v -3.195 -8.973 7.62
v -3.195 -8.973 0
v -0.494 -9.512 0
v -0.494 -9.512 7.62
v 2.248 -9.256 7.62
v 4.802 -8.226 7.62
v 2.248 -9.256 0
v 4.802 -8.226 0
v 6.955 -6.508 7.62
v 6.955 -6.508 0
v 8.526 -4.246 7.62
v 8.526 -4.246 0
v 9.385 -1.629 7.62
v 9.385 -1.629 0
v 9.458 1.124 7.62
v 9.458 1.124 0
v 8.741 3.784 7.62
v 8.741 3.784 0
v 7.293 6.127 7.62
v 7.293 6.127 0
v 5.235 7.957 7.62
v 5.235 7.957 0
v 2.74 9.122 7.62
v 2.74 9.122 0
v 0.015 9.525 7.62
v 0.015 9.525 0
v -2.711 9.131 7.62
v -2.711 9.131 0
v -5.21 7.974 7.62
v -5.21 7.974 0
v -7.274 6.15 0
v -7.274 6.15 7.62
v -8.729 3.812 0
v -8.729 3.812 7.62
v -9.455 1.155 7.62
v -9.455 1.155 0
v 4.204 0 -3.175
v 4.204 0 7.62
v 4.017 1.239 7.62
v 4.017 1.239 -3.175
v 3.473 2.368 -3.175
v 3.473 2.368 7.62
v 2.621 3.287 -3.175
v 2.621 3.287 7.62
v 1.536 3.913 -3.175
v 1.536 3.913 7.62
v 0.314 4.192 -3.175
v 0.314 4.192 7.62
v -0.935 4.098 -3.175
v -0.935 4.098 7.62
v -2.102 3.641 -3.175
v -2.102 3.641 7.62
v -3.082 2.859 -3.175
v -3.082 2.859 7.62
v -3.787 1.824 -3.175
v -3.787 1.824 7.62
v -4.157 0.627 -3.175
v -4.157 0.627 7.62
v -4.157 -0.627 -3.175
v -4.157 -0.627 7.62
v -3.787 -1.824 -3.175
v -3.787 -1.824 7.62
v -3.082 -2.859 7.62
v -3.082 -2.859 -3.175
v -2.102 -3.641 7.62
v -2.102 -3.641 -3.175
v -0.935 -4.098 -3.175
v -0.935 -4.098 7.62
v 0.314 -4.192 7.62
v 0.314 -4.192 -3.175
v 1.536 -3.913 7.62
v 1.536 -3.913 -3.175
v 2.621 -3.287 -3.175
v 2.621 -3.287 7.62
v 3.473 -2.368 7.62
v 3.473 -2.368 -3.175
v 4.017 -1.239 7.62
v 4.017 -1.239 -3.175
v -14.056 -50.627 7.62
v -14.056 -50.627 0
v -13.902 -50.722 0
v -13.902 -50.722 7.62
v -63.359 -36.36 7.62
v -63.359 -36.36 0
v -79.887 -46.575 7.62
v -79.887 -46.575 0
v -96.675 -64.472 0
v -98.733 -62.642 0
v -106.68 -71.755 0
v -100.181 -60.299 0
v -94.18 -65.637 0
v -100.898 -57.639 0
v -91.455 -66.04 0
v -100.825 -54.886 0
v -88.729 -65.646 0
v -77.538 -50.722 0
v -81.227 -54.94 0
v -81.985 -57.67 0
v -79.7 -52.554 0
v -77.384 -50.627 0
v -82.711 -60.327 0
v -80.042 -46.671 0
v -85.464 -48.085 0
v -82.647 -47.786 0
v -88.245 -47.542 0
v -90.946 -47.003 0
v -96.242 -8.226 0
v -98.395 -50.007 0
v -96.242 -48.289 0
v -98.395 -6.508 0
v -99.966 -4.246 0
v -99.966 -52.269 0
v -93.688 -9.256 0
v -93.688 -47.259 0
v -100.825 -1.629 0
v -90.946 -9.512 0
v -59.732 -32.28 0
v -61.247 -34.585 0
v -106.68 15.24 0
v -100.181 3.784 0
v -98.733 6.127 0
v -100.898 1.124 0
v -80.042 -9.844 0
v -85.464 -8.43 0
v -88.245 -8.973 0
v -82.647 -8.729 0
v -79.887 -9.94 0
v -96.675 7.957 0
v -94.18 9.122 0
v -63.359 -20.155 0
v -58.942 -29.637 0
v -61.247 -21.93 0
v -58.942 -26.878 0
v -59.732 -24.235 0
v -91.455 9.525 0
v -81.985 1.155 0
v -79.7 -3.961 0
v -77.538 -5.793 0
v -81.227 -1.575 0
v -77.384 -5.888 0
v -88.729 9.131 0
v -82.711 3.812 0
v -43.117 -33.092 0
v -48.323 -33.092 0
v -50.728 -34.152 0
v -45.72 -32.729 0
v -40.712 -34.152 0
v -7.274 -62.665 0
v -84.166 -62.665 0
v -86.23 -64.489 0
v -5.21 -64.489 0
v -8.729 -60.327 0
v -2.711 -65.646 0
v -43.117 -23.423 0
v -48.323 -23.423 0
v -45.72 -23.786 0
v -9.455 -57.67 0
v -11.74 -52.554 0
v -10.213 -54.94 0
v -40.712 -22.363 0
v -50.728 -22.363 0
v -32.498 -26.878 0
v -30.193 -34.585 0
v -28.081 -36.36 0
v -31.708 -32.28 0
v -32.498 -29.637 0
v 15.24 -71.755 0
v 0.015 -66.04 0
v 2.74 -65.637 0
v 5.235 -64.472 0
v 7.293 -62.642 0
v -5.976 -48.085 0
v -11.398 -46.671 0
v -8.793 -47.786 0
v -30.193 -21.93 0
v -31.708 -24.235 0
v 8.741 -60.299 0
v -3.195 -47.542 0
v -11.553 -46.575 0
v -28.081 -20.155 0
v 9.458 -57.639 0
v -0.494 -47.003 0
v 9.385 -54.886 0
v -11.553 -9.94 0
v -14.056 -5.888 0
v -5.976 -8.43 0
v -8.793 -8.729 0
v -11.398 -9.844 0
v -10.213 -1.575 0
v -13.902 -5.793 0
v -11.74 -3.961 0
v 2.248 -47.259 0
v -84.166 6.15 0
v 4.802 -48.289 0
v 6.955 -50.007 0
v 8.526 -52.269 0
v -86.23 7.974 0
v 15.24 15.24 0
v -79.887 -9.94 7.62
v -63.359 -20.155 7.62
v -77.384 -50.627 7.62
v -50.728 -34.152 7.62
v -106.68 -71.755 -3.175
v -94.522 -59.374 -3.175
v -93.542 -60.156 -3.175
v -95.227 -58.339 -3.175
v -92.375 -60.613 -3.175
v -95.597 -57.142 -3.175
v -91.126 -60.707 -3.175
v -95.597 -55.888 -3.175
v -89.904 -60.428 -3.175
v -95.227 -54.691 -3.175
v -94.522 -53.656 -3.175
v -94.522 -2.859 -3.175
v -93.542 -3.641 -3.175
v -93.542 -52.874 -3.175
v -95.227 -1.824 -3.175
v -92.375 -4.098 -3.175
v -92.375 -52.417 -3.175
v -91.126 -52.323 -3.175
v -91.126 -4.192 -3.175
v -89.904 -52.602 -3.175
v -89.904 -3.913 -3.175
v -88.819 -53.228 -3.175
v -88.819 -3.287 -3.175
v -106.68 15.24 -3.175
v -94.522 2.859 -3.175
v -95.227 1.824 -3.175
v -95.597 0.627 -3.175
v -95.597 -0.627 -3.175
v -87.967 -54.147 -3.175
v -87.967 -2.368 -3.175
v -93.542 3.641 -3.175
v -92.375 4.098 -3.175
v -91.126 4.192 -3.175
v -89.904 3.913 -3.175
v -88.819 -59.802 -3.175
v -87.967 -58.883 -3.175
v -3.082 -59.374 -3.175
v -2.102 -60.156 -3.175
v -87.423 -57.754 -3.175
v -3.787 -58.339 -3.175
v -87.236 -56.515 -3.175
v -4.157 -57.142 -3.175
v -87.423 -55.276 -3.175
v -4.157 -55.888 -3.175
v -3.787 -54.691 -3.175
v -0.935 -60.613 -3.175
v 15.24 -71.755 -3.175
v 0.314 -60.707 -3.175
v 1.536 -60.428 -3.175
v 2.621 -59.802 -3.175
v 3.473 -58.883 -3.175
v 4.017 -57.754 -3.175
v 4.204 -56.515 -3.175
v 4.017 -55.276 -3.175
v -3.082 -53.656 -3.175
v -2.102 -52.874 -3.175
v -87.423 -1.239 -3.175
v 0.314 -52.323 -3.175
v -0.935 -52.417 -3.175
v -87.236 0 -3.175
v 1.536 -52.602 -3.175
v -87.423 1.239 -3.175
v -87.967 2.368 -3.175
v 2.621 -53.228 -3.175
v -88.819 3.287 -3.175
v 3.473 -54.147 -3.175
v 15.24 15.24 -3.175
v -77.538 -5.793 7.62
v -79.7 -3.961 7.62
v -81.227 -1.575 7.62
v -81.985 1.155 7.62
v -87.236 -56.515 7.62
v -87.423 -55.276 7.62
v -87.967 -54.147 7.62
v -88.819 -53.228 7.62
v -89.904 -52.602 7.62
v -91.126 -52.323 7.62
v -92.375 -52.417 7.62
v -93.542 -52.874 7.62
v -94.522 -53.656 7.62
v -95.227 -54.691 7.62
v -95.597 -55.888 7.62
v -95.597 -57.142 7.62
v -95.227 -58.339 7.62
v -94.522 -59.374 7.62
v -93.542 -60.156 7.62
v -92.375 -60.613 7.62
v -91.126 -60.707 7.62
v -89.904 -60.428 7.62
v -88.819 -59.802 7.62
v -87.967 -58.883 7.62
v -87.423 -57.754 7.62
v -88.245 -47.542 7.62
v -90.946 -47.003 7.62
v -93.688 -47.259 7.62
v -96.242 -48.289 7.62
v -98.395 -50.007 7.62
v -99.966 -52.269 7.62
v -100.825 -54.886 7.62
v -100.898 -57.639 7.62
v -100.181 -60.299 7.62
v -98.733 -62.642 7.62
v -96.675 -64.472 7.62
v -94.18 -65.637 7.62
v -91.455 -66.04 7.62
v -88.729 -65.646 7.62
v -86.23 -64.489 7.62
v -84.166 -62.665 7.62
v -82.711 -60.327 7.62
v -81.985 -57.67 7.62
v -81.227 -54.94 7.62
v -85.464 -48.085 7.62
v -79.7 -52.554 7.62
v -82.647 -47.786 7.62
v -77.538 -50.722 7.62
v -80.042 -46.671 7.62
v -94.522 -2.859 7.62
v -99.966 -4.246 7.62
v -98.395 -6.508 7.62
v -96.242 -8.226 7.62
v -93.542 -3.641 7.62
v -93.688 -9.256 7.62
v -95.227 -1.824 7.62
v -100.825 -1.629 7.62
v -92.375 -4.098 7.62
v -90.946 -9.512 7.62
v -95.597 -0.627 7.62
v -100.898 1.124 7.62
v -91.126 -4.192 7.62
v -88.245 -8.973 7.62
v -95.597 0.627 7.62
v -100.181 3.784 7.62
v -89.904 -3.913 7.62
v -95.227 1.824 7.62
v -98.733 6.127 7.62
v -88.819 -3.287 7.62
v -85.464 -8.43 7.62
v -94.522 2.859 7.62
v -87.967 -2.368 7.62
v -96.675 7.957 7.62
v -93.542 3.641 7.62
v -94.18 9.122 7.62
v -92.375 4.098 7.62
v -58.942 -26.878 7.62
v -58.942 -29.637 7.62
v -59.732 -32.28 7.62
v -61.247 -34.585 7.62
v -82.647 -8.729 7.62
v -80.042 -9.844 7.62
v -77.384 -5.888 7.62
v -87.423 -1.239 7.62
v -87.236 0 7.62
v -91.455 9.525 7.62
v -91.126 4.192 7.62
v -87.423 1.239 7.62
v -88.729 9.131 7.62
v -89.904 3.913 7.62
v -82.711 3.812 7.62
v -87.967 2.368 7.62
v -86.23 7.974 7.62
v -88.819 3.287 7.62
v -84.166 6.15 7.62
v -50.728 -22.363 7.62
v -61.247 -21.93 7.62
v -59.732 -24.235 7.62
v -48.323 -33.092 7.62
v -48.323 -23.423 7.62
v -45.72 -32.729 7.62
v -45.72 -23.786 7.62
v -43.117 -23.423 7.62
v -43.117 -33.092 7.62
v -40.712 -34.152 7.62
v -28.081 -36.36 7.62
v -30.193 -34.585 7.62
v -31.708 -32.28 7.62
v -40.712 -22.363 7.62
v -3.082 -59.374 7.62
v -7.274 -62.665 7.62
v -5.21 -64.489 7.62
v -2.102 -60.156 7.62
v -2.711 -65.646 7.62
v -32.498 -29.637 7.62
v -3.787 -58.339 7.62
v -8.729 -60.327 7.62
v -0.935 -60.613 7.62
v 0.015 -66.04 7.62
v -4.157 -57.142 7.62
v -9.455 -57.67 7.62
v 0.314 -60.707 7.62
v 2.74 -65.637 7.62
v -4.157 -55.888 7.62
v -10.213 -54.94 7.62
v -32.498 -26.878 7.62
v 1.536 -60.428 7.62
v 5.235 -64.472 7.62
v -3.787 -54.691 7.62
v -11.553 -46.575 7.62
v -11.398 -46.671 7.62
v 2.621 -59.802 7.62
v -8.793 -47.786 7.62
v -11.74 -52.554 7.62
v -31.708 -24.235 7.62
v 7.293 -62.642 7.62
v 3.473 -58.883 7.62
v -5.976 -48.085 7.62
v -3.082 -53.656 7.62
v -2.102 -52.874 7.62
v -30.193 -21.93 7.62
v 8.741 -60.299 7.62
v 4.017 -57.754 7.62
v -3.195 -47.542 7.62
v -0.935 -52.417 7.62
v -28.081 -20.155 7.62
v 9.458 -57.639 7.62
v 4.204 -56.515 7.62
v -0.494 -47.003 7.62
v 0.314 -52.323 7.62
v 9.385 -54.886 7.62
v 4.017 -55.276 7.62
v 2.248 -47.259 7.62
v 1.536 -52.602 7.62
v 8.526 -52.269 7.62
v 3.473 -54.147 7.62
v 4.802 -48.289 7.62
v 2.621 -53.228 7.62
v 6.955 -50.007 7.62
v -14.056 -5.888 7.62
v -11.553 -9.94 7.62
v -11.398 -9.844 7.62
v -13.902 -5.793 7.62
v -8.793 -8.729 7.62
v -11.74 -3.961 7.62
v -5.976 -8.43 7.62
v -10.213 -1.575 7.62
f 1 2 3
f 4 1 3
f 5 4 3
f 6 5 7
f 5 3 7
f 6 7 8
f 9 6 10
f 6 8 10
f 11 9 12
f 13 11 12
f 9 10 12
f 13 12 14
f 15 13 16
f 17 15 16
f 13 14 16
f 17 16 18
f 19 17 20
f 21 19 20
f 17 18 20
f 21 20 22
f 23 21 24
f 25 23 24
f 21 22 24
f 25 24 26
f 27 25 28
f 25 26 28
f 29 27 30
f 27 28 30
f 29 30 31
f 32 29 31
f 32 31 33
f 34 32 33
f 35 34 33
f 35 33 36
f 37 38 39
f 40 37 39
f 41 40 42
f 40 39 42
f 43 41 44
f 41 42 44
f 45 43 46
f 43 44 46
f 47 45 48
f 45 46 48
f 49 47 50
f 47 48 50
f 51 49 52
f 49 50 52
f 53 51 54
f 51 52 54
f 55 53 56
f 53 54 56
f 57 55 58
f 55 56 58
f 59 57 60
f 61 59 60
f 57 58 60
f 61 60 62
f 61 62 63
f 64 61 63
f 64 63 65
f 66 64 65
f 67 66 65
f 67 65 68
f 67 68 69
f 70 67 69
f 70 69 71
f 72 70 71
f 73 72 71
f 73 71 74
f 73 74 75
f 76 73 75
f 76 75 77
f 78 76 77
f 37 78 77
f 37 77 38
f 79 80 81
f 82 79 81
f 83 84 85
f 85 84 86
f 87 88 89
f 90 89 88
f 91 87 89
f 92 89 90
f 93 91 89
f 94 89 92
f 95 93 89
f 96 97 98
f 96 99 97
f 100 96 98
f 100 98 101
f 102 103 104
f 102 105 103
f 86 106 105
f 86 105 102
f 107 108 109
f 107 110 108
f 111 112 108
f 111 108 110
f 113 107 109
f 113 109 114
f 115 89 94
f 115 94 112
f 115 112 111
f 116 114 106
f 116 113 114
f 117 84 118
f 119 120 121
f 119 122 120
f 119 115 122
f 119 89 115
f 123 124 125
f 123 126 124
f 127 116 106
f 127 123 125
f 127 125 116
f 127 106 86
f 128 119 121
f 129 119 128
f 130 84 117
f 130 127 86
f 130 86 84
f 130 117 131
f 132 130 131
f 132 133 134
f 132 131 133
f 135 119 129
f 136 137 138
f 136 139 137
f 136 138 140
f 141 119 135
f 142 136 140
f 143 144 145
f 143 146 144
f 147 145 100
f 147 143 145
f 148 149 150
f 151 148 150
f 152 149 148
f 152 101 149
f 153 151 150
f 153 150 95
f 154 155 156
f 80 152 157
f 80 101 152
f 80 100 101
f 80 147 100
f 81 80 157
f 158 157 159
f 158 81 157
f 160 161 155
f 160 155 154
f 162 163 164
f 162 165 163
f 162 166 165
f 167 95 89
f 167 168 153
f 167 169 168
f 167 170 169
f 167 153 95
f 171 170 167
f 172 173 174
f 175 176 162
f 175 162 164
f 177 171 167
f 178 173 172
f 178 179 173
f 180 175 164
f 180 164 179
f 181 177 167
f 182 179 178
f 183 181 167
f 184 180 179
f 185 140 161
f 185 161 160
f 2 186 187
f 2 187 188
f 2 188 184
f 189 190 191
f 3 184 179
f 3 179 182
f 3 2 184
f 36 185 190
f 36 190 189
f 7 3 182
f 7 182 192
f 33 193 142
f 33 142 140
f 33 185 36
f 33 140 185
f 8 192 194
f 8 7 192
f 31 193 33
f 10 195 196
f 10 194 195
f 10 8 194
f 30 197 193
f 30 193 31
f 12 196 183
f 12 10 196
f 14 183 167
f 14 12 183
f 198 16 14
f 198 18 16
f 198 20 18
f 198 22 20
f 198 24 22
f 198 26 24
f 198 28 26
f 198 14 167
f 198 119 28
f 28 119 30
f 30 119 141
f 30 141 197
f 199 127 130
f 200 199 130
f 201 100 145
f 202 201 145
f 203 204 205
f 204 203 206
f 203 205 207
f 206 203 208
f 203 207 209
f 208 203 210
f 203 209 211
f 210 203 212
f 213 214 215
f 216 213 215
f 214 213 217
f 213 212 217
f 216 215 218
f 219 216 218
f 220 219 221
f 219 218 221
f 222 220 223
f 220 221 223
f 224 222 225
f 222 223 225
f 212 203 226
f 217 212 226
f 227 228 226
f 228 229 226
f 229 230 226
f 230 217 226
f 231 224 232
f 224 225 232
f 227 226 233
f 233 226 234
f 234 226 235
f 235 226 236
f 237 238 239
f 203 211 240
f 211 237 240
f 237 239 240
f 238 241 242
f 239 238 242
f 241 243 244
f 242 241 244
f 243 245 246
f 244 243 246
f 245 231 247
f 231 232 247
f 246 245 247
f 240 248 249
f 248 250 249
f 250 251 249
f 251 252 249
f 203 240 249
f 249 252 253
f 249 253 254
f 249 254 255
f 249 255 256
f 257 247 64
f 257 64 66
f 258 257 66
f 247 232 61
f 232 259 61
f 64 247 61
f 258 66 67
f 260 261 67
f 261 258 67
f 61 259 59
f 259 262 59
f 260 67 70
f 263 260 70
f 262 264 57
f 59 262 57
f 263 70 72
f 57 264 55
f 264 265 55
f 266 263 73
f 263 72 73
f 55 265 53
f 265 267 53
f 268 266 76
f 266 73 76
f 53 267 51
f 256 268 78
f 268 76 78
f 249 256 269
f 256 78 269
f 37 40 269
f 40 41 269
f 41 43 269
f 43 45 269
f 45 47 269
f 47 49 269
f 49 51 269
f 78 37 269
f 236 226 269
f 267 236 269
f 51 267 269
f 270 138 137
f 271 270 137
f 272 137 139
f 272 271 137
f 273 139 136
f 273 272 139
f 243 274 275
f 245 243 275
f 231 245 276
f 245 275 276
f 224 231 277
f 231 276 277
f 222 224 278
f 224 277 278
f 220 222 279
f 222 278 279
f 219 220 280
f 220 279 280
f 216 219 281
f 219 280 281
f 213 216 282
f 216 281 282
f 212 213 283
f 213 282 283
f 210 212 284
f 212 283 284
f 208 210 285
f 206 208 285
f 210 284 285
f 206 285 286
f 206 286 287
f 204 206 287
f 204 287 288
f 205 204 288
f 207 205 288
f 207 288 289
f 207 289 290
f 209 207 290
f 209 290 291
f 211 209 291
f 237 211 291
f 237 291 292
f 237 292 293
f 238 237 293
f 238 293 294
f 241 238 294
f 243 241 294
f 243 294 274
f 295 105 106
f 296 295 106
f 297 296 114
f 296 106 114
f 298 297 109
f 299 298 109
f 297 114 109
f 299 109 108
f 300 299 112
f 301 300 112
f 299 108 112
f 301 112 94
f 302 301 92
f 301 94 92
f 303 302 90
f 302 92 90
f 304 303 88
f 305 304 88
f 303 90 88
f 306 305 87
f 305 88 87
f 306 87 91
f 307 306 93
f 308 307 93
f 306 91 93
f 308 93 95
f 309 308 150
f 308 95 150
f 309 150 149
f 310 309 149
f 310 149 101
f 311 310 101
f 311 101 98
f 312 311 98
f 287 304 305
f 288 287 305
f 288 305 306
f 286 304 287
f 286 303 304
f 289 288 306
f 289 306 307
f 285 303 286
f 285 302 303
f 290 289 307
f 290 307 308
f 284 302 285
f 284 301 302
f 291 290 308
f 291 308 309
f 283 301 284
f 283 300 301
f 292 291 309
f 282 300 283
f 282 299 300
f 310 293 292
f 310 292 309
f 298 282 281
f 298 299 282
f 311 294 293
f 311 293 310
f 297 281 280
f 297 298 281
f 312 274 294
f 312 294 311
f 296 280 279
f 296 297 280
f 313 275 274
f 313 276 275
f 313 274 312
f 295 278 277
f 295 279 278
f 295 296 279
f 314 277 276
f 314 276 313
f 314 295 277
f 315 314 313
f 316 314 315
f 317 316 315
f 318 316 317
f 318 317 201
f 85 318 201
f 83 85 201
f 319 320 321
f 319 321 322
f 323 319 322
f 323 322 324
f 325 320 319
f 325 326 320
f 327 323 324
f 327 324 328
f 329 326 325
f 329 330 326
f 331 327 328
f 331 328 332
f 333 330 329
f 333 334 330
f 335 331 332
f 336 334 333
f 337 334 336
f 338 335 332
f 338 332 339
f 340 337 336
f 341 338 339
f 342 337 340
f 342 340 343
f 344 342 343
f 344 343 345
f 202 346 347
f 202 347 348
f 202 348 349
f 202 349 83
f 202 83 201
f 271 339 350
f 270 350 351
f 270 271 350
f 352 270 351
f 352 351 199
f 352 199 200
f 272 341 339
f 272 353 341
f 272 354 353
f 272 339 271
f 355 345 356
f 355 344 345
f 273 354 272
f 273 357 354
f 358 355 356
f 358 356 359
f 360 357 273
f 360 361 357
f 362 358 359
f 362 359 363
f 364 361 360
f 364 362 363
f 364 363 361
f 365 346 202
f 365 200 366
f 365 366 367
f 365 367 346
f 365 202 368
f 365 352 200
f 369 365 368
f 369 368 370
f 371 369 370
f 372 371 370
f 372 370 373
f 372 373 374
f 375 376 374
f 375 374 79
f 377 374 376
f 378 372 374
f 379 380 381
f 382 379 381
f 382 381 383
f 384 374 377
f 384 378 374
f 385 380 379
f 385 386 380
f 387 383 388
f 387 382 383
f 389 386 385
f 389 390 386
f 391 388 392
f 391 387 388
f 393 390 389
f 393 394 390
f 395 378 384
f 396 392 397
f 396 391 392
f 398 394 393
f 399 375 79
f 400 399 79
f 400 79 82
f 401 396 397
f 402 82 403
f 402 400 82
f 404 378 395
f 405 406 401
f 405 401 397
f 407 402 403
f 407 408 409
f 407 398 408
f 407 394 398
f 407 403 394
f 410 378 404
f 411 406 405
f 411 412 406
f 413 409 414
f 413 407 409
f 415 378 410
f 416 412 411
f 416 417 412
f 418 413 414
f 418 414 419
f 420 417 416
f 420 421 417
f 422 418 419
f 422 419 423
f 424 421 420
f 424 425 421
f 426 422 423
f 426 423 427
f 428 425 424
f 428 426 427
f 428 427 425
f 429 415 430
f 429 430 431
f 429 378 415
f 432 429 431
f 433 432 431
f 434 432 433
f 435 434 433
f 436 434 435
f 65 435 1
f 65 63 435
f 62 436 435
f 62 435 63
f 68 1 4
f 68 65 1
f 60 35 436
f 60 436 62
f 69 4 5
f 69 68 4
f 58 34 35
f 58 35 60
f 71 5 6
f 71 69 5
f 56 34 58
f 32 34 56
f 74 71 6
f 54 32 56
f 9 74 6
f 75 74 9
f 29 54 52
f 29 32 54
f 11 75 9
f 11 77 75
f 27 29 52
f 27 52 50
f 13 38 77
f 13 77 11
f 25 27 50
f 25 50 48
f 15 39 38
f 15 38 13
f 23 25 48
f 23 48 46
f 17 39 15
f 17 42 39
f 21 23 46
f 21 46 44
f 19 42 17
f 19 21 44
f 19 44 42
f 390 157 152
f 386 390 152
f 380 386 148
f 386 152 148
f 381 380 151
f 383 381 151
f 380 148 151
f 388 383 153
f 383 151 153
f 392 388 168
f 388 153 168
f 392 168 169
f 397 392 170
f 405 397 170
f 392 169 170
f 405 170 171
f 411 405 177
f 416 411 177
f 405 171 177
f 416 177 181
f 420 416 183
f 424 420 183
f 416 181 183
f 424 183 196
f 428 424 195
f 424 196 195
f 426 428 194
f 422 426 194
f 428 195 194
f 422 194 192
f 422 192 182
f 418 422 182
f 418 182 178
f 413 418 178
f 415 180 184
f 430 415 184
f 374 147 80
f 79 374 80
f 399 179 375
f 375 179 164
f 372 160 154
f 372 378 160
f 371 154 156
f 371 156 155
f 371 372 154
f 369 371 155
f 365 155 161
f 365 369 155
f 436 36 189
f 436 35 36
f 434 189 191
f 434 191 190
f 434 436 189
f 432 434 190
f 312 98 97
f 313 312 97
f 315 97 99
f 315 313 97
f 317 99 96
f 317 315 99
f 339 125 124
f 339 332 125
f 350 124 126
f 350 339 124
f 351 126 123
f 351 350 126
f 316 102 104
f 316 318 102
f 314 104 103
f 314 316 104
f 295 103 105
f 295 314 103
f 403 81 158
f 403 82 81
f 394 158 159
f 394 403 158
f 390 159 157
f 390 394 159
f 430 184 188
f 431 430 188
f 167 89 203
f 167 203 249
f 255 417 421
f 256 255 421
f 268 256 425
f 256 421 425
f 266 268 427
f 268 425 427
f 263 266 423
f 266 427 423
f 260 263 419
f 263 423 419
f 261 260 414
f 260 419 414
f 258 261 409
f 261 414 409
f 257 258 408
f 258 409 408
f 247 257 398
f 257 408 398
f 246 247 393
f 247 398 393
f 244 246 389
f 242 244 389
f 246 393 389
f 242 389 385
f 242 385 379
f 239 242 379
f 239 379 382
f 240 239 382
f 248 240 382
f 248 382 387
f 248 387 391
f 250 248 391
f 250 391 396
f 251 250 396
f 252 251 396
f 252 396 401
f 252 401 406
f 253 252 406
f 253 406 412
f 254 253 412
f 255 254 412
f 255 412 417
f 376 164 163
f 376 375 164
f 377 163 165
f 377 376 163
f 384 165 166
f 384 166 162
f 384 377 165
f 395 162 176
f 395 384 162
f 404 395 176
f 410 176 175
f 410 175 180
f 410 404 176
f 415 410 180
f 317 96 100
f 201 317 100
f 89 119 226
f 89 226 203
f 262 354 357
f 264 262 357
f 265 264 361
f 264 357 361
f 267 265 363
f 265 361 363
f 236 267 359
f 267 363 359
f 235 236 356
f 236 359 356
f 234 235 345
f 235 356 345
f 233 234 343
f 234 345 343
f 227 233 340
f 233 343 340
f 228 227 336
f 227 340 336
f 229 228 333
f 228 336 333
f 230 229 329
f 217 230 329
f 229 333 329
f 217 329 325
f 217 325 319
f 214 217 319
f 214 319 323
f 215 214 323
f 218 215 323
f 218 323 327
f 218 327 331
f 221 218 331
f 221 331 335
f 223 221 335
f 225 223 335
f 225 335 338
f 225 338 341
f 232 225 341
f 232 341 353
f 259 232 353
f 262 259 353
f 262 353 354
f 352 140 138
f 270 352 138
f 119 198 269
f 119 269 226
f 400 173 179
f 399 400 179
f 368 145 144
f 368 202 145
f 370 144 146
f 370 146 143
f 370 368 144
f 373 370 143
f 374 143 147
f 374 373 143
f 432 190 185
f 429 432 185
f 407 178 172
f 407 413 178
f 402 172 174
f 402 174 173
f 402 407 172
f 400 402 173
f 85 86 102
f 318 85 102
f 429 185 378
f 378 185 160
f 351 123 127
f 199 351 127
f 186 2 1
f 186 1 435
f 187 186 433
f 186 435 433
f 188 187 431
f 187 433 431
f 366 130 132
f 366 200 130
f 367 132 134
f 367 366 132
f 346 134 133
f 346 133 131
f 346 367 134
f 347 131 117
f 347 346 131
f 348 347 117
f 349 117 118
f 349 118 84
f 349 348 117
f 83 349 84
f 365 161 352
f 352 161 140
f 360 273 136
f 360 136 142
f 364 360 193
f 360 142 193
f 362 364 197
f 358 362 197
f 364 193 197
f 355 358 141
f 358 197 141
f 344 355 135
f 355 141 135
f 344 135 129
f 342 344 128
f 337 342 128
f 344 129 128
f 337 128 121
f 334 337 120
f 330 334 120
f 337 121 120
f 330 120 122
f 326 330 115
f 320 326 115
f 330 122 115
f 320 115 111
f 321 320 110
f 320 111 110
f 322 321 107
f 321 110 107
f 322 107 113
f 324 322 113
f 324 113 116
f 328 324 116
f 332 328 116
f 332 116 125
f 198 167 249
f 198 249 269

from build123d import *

# Parameters (mm, degrees)
F1_DEPTH = 3.175
F3_DEPTH = 7.62
F4_R     = 9.525
F5_R     = 4.2037
F6_DEPTH = 10.796


with BuildPart() as f1:
    # F0 (on Top) → F1 (new body)
    with BuildSketch(Plane.XY):
        with BuildLine():
            Line((15.24, -56.515), (15.24, 0))
            ThreePointArc((15.24, 0), (-10.7763073453, -10.7763073453), (0, 15.24))
            Line((0, 15.24), (-91.44, 15.24))
            ThreePointArc((-91.44, 15.24), (-80.6636926547, 10.7763073453), (-76.2, 0))
            ThreePointArc((-76.2, 0), (-91.44, -15.24), (-106.68, 0))
            Line((-106.68, 0), (-106.68, -56.515))
            ThreePointArc((-106.68, -56.515), (-91.44, -41.275), (-76.2, -56.515))
            ThreePointArc((-76.2, -56.515), (-80.6636926547, -67.2913073453), (-91.44, -71.755))
            Line((-91.44, -71.755), (0, -71.755))
            ThreePointArc((0, -71.755), (-10.7763073453, -45.7386926547), (15.24, -56.515))
        make_face()
        with BuildLine():
            ThreePointArc((-106.68, -56.515), (-102.2163073453, -67.2913073453), (-91.44, -71.755))
            ThreePointArc((-91.44, -71.755), (-80.6636926547, -67.2913073453), (-76.2, -56.515))
            ThreePointArc((-76.2, -56.515), (-91.44, -41.275), (-106.68, -56.515))
        make_face()
        with BuildLine():
            ThreePointArc((-76.2, 0), (-80.6636926547, 10.7763073453), (-91.44, 15.24))
            ThreePointArc((-91.44, 15.24), (-102.2163073453, 10.7763073453), (-106.68, 0))
            ThreePointArc((-106.68, 0), (-91.44, -15.24), (-76.2, 0))
        make_face()
        with BuildLine():
            ThreePointArc((0, 15.24), (-10.7763073453, -10.7763073453), (15.24, 0))
            ThreePointArc((15.24, 0), (10.7763073453, 10.7763073453), (0, 15.24))
        make_face()
        with BuildLine():
            ThreePointArc((0, -71.755), (10.7763073453, -67.2913073453), (15.24, -56.515))
            ThreePointArc((15.24, -56.515), (-10.7763073453, -45.7386926547), (0, -71.755))
        make_face()
        with BuildLine():
            Line((15.24, -71.755), (15.24, -56.515))
            ThreePointArc((15.24, -56.515), (10.7763073453, -67.2913073453), (0, -71.755))
            Line((0, -71.755), (15.24, -71.755))
        make_face()
        with BuildLine():
            Line((-106.68, -71.755), (-91.44, -71.755))
            ThreePointArc((-91.44, -71.755), (-102.2163073453, -67.2913073453), (-106.68, -56.515))
            Line((-106.68, -56.515), (-106.68, -71.755))
        make_face()
        with BuildLine():
            ThreePointArc((-106.68, 0), (-102.2163073453, 10.7763073453), (-91.44, 15.24))
            Line((-91.44, 15.24), (-106.68, 15.24))
            Line((-106.68, 15.24), (-106.68, 0))
        make_face()
        with BuildLine():
            ThreePointArc((0, 15.24), (10.7763073453, 10.7763073453), (15.24, 0))
            Line((15.24, 0), (15.24, 15.24))
            Line((15.24, 15.24), (0, 15.24))
        make_face()
    extrude(amount=-F1_DEPTH)

    # F2 (on face) → F3 (join)
    with BuildSketch(Plane.XY):
        with BuildLine():
            Line((-9.0970156165, -2.8231067769), (-14.056494823, -5.8883404532))
            ThreePointArc((-14.056494823, -5.8883404532), (-12.9637932823, -8.0123444592), (-11.5526371794, -9.9395258539))
            Line((-11.5526371794, -9.9395258539), (-6.593157973, -6.8742921776))
            ThreePointArc((-6.593157973, -6.8742921776), (8.1023708015, 5.007715287), (-9.0970156165, -2.8231067769))
        make_face()
        with BuildLine():
            ThreePointArc((-11.5526371794, -46.5754741461), (-12.9637932823, -48.5026555408), (-14.056494823, -50.6266595468))
            Line((-14.056494823, -50.6266595468), (-9.0970156165, -53.6918932231))
            ThreePointArc((-9.0970156165, -53.6918932231), (8.1023708015, -61.522715287), (-6.593157973, -49.6407078224))
            Line((-6.593157973, -49.6407078224), (-11.5526371794, -46.5754741461))
        make_face()
        with BuildLine():
            ThreePointArc((-77.383505177, -50.6266595468), (-78.4762067177, -48.5026555408), (-79.8873628206, -46.5754741461))
            Line((-79.8873628206, -46.5754741461), (-84.846842027, -49.6407078224))
            ThreePointArc((-84.846842027, -49.6407078224), (-99.5423708015, -61.522715287), (-82.3429843835, -53.6918932231))
            Line((-82.3429843835, -53.6918932231), (-77.383505177, -50.6266595468))
        make_face()
        with BuildLine():
            ThreePointArc((-82.3429843835, -2.8231067769), (-99.5423708015, 5.007715287), (-84.846842027, -6.8742921776))
            Line((-84.846842027, -6.8742921776), (-79.8873628206, -9.9395258539))
            ThreePointArc((-79.8873628206, -9.9395258539), (-78.4762067177, -8.0123444592), (-77.383505177, -5.8883404532))
            Line((-77.383505177, -5.8883404532), (-82.3429843835, -2.8231067769))
        make_face()
        with BuildLine():
            ThreePointArc((-77.383505177, -5.8883404532), (-78.4762067177, -8.0123444592), (-79.8873628206, -9.9395258539))
            Line((-79.8873628206, -9.9395258539), (-50.249292292, -28.2575))
            Line((-50.249292292, -28.2575), (-79.8873628206, -46.5754741461))
            ThreePointArc((-79.8873628206, -46.5754741461), (-78.4762067177, -48.5026555408), (-77.383505177, -50.6266595468))
            Line((-77.383505177, -50.6266595468), (-45.72, -31.0568542638))
            Line((-45.72, -31.0568542638), (-14.056494823, -50.6266595468))
            ThreePointArc((-14.056494823, -50.6266595468), (-12.9637932823, -48.5026555408), (-11.5526371794, -46.5754741461))
            Line((-11.5526371794, -46.5754741461), (-41.190707708, -28.2575))
            Line((-41.190707708, -28.2575), (-11.5526371794, -9.9395258539))
            ThreePointArc((-11.5526371794, -9.9395258539), (-12.9637932823, -8.0123444592), (-14.056494823, -5.8883404532))
            Line((-14.056494823, -5.8883404532), (-45.72, -25.4581457362))
            Line((-45.72, -25.4581457362), (-77.383505177, -5.8883404532))
        make_face()
    extrude(amount=F3_DEPTH)

    # F4
    f4_edges = [f1.edges().sort_by_distance(p)[0] for p in [
        (-45.72, -31.056854, 3.81),
        (-82.342984, -53.691893, 3.81),
        (-9.097016, -53.691893, 3.81),
        (-6.593158, -6.874292, 3.81),
        (-84.846842, -49.640708, 3.81),
        (-50.249292, -28.2575, 3.81),
        (-84.846842, -6.874292, 3.81),
        (-82.342984, -2.823107, 3.81),
        (-45.72, -25.458146, 3.81),
        (-9.097016, -2.823107, 3.81),
        (-41.190708, -28.2575, 3.81),
        (-6.593158, -49.640708, 3.81),
    ]]
    fillet(f4_edges, radius=F4_R)

    # F5 (on face) → F6 (cut, through all)
    with BuildSketch(Plane.XY.offset(7.62)):
        with Locations((0, -56.515)):
            Circle(F5_R)
        with Locations((-91.44, -56.515)):
            Circle(F5_R)
        with Locations((-91.44, 0)):
            Circle(F5_R)
        Circle(F5_R)
    extrude(amount=-F6_DEPTH, mode=Mode.SUBTRACT)


solid = f1.part
